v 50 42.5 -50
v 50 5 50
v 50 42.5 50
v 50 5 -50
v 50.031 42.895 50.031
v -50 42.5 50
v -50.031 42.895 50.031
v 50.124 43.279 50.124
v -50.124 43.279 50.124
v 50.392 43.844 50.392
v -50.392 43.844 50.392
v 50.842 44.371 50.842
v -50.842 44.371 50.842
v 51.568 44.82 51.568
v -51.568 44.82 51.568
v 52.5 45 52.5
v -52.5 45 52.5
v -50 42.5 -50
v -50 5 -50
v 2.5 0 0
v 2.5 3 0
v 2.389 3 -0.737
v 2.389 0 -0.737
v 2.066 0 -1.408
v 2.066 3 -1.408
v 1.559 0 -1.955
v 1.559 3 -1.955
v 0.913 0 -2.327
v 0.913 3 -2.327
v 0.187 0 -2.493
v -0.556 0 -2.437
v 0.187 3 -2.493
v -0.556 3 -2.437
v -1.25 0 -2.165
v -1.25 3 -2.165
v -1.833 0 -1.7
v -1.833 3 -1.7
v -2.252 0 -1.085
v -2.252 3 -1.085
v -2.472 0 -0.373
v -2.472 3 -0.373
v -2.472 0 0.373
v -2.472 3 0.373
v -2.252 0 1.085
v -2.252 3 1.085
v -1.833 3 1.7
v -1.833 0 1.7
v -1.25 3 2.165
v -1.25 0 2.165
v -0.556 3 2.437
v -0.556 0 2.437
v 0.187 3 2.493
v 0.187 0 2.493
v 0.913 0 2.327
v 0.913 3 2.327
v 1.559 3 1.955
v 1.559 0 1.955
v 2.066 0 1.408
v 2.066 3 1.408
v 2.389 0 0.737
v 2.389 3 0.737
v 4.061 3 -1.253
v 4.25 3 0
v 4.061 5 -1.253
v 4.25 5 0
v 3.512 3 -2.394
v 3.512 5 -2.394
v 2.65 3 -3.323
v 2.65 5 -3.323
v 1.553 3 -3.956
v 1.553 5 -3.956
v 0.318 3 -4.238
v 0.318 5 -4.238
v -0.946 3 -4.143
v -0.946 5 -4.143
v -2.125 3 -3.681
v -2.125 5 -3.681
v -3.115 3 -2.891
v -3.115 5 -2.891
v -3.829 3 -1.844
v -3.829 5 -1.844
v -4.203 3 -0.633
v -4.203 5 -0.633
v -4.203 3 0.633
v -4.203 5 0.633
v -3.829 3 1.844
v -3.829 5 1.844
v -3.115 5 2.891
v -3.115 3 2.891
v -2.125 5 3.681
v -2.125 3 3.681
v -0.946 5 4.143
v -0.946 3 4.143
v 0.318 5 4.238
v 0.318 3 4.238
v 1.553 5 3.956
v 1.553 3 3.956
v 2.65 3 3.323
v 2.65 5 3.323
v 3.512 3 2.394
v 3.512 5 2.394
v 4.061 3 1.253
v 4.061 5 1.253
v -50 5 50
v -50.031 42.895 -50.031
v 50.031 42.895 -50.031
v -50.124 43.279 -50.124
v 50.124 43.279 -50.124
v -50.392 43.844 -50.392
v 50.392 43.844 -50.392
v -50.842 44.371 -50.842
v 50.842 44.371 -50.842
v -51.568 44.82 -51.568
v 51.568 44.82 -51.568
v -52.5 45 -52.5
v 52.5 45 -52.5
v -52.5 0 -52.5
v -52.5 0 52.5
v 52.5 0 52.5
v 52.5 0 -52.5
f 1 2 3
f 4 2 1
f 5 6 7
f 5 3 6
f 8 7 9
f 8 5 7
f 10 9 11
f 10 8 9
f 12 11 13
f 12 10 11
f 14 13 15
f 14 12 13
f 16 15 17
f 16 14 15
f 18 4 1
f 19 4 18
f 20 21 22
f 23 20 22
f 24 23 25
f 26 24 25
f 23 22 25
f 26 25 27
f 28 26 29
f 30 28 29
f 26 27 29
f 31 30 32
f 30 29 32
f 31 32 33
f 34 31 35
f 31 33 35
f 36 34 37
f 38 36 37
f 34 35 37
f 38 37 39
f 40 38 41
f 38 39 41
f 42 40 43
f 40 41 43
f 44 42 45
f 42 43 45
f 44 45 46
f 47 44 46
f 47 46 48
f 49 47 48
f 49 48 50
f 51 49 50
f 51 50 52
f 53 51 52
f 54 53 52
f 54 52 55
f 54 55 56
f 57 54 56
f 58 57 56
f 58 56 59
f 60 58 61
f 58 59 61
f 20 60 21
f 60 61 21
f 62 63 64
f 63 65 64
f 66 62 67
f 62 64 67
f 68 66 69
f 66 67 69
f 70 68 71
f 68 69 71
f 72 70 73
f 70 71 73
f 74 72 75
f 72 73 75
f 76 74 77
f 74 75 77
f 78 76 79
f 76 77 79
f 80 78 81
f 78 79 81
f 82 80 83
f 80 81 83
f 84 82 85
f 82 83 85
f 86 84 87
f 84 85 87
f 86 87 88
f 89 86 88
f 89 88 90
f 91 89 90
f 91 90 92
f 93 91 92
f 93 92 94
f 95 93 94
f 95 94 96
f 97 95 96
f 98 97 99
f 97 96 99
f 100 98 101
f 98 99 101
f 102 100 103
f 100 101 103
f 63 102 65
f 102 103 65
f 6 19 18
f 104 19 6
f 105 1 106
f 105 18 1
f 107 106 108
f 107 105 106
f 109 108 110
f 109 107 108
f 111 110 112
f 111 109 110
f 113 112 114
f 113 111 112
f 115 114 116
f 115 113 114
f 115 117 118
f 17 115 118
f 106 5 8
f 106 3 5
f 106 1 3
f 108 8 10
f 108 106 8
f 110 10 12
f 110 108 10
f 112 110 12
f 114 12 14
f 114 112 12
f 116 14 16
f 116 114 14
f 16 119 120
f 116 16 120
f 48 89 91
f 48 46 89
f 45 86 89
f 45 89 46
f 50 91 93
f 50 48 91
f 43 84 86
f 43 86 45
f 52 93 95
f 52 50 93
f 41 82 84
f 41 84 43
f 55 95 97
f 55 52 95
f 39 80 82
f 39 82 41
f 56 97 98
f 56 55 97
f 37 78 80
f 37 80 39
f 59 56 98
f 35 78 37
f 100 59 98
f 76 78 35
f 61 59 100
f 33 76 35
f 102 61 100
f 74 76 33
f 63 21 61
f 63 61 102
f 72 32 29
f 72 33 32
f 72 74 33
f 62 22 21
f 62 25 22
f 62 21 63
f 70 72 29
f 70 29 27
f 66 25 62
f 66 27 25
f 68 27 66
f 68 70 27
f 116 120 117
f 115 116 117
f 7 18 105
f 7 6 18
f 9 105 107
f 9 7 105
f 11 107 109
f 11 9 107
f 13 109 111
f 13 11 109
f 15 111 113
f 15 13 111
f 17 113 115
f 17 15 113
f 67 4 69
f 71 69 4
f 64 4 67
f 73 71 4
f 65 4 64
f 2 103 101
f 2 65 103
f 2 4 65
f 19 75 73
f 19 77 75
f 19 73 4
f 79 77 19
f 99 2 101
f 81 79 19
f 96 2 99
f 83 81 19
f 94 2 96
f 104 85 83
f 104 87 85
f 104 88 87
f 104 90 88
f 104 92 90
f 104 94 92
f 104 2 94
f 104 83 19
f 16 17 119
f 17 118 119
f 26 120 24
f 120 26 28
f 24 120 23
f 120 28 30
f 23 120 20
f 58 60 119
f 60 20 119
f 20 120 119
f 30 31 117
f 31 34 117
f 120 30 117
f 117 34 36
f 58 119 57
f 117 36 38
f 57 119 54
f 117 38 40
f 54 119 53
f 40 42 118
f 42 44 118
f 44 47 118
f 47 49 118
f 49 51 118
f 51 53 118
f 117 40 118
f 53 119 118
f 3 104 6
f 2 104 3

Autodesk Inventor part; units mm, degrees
ref_plane "YZ Plane" through (0, 0, 0) normal (1, 0, 0) x (0, 1, 0)
ref_plane "XZ Plane" through (0, 0, 0) normal (0, 1, 0) x (-1, 0, 0)
ref_plane "XY Plane" through (0, 0, 0) normal (0, 0, 1) x (1, 0, 0)
sketch "Sketch1" plane through (0, 0, 0) normal (0, 1, 0) x (-1, 0, 0)
  line L0 (-52.5, -52.5) -> (52.5, -52.5)
  line L1 (52.5, -52.5) -> (52.5, 52.5)
  line L2 (52.5, 52.5) -> (-52.5, 52.5)
  line L3 (-52.5, 52.5) -> (-52.5, -52.5)
  line L4 (-52.5, -52.5) -> (52.5, 52.5) construction
  line L5 (52.5, -52.5) -> (-52.5, 52.5) construction
  point P0 (0, 0)
extrude "Extrusion1" add sketch "Sketch1" along normal blind 5
sketch "Sketch4" plane through (0, 5, 0) normal (0, 1, 0) x (1, 0, 0)
  line L0 (-52.5, 52.5) -> (-52.5, -52.5) projected
  line L1 (52.5, 52.5) -> (-52.5, 52.5)
  line L2 (-52.5, 52.5) -> (-52.5, -52.5)
  line L3 (-52.5, -52.5) -> (52.5, -52.5)
  line L4 (52.5, -52.5) -> (52.5, 52.5)
  line L5 (52.5, 52.5) -> (-52.5, -52.5) construction
  line L6 (-52.5, 52.5) -> (52.5, -52.5) construction
  line L7 (50, 50) -> (-50, 50)
  line L8 (-50, 50) -> (-50, -50)
  line L9 (-50, -50) -> (50, -50)
  line L10 (50, -50) -> (50, 50)
  line L11 (50, 50) -> (-50, -50) construction
  line L12 (-50, 50) -> (50, -50) construction
  line L13 (52.5, 52.5) -> (-52.5, 52.5)
  line L14 (-52.5, 52.5) -> (-52.5, -52.5)
  line L15 (-52.5, -52.5) -> (52.5, -52.5)
  line L16 (52.5, -52.5) -> (52.5, 52.5)
  line L17 (52.5, 52.5) -> (-52.5, -52.5) construction
  line L18 (-52.5, 52.5) -> (52.5, -52.5) construction
  point P0 (0, 0)
extrude "Extrusion2" add sketch "Sketch4" along normal blind 40
fillet "Fillet1" radius 2.5 4 edges at (0, 45, -50) (-50, 45, 0) (0, 45, 50) (50, 45, 0)
sketch "Sketch5" plane through (0, 5, 0) normal (0, 1, 0) x (1, 0, 0)
  circle A0 centre (0, 0) radius 2.5
  dimension "d12" = 5
extrude "Extrusion3" cut sketch "Sketch5" against normal blind 10
sketch "Sketch6" plane through (0, 5, 0) normal (0, 1, 0) x (1, 0, 0)
  circle A0 centre (0, 0) radius 4.25
  dimension "d15" = 8.5
extrude "Extrusion4" cut sketch "Sketch6" against normal blind 2
properties part number "KwadratP"
